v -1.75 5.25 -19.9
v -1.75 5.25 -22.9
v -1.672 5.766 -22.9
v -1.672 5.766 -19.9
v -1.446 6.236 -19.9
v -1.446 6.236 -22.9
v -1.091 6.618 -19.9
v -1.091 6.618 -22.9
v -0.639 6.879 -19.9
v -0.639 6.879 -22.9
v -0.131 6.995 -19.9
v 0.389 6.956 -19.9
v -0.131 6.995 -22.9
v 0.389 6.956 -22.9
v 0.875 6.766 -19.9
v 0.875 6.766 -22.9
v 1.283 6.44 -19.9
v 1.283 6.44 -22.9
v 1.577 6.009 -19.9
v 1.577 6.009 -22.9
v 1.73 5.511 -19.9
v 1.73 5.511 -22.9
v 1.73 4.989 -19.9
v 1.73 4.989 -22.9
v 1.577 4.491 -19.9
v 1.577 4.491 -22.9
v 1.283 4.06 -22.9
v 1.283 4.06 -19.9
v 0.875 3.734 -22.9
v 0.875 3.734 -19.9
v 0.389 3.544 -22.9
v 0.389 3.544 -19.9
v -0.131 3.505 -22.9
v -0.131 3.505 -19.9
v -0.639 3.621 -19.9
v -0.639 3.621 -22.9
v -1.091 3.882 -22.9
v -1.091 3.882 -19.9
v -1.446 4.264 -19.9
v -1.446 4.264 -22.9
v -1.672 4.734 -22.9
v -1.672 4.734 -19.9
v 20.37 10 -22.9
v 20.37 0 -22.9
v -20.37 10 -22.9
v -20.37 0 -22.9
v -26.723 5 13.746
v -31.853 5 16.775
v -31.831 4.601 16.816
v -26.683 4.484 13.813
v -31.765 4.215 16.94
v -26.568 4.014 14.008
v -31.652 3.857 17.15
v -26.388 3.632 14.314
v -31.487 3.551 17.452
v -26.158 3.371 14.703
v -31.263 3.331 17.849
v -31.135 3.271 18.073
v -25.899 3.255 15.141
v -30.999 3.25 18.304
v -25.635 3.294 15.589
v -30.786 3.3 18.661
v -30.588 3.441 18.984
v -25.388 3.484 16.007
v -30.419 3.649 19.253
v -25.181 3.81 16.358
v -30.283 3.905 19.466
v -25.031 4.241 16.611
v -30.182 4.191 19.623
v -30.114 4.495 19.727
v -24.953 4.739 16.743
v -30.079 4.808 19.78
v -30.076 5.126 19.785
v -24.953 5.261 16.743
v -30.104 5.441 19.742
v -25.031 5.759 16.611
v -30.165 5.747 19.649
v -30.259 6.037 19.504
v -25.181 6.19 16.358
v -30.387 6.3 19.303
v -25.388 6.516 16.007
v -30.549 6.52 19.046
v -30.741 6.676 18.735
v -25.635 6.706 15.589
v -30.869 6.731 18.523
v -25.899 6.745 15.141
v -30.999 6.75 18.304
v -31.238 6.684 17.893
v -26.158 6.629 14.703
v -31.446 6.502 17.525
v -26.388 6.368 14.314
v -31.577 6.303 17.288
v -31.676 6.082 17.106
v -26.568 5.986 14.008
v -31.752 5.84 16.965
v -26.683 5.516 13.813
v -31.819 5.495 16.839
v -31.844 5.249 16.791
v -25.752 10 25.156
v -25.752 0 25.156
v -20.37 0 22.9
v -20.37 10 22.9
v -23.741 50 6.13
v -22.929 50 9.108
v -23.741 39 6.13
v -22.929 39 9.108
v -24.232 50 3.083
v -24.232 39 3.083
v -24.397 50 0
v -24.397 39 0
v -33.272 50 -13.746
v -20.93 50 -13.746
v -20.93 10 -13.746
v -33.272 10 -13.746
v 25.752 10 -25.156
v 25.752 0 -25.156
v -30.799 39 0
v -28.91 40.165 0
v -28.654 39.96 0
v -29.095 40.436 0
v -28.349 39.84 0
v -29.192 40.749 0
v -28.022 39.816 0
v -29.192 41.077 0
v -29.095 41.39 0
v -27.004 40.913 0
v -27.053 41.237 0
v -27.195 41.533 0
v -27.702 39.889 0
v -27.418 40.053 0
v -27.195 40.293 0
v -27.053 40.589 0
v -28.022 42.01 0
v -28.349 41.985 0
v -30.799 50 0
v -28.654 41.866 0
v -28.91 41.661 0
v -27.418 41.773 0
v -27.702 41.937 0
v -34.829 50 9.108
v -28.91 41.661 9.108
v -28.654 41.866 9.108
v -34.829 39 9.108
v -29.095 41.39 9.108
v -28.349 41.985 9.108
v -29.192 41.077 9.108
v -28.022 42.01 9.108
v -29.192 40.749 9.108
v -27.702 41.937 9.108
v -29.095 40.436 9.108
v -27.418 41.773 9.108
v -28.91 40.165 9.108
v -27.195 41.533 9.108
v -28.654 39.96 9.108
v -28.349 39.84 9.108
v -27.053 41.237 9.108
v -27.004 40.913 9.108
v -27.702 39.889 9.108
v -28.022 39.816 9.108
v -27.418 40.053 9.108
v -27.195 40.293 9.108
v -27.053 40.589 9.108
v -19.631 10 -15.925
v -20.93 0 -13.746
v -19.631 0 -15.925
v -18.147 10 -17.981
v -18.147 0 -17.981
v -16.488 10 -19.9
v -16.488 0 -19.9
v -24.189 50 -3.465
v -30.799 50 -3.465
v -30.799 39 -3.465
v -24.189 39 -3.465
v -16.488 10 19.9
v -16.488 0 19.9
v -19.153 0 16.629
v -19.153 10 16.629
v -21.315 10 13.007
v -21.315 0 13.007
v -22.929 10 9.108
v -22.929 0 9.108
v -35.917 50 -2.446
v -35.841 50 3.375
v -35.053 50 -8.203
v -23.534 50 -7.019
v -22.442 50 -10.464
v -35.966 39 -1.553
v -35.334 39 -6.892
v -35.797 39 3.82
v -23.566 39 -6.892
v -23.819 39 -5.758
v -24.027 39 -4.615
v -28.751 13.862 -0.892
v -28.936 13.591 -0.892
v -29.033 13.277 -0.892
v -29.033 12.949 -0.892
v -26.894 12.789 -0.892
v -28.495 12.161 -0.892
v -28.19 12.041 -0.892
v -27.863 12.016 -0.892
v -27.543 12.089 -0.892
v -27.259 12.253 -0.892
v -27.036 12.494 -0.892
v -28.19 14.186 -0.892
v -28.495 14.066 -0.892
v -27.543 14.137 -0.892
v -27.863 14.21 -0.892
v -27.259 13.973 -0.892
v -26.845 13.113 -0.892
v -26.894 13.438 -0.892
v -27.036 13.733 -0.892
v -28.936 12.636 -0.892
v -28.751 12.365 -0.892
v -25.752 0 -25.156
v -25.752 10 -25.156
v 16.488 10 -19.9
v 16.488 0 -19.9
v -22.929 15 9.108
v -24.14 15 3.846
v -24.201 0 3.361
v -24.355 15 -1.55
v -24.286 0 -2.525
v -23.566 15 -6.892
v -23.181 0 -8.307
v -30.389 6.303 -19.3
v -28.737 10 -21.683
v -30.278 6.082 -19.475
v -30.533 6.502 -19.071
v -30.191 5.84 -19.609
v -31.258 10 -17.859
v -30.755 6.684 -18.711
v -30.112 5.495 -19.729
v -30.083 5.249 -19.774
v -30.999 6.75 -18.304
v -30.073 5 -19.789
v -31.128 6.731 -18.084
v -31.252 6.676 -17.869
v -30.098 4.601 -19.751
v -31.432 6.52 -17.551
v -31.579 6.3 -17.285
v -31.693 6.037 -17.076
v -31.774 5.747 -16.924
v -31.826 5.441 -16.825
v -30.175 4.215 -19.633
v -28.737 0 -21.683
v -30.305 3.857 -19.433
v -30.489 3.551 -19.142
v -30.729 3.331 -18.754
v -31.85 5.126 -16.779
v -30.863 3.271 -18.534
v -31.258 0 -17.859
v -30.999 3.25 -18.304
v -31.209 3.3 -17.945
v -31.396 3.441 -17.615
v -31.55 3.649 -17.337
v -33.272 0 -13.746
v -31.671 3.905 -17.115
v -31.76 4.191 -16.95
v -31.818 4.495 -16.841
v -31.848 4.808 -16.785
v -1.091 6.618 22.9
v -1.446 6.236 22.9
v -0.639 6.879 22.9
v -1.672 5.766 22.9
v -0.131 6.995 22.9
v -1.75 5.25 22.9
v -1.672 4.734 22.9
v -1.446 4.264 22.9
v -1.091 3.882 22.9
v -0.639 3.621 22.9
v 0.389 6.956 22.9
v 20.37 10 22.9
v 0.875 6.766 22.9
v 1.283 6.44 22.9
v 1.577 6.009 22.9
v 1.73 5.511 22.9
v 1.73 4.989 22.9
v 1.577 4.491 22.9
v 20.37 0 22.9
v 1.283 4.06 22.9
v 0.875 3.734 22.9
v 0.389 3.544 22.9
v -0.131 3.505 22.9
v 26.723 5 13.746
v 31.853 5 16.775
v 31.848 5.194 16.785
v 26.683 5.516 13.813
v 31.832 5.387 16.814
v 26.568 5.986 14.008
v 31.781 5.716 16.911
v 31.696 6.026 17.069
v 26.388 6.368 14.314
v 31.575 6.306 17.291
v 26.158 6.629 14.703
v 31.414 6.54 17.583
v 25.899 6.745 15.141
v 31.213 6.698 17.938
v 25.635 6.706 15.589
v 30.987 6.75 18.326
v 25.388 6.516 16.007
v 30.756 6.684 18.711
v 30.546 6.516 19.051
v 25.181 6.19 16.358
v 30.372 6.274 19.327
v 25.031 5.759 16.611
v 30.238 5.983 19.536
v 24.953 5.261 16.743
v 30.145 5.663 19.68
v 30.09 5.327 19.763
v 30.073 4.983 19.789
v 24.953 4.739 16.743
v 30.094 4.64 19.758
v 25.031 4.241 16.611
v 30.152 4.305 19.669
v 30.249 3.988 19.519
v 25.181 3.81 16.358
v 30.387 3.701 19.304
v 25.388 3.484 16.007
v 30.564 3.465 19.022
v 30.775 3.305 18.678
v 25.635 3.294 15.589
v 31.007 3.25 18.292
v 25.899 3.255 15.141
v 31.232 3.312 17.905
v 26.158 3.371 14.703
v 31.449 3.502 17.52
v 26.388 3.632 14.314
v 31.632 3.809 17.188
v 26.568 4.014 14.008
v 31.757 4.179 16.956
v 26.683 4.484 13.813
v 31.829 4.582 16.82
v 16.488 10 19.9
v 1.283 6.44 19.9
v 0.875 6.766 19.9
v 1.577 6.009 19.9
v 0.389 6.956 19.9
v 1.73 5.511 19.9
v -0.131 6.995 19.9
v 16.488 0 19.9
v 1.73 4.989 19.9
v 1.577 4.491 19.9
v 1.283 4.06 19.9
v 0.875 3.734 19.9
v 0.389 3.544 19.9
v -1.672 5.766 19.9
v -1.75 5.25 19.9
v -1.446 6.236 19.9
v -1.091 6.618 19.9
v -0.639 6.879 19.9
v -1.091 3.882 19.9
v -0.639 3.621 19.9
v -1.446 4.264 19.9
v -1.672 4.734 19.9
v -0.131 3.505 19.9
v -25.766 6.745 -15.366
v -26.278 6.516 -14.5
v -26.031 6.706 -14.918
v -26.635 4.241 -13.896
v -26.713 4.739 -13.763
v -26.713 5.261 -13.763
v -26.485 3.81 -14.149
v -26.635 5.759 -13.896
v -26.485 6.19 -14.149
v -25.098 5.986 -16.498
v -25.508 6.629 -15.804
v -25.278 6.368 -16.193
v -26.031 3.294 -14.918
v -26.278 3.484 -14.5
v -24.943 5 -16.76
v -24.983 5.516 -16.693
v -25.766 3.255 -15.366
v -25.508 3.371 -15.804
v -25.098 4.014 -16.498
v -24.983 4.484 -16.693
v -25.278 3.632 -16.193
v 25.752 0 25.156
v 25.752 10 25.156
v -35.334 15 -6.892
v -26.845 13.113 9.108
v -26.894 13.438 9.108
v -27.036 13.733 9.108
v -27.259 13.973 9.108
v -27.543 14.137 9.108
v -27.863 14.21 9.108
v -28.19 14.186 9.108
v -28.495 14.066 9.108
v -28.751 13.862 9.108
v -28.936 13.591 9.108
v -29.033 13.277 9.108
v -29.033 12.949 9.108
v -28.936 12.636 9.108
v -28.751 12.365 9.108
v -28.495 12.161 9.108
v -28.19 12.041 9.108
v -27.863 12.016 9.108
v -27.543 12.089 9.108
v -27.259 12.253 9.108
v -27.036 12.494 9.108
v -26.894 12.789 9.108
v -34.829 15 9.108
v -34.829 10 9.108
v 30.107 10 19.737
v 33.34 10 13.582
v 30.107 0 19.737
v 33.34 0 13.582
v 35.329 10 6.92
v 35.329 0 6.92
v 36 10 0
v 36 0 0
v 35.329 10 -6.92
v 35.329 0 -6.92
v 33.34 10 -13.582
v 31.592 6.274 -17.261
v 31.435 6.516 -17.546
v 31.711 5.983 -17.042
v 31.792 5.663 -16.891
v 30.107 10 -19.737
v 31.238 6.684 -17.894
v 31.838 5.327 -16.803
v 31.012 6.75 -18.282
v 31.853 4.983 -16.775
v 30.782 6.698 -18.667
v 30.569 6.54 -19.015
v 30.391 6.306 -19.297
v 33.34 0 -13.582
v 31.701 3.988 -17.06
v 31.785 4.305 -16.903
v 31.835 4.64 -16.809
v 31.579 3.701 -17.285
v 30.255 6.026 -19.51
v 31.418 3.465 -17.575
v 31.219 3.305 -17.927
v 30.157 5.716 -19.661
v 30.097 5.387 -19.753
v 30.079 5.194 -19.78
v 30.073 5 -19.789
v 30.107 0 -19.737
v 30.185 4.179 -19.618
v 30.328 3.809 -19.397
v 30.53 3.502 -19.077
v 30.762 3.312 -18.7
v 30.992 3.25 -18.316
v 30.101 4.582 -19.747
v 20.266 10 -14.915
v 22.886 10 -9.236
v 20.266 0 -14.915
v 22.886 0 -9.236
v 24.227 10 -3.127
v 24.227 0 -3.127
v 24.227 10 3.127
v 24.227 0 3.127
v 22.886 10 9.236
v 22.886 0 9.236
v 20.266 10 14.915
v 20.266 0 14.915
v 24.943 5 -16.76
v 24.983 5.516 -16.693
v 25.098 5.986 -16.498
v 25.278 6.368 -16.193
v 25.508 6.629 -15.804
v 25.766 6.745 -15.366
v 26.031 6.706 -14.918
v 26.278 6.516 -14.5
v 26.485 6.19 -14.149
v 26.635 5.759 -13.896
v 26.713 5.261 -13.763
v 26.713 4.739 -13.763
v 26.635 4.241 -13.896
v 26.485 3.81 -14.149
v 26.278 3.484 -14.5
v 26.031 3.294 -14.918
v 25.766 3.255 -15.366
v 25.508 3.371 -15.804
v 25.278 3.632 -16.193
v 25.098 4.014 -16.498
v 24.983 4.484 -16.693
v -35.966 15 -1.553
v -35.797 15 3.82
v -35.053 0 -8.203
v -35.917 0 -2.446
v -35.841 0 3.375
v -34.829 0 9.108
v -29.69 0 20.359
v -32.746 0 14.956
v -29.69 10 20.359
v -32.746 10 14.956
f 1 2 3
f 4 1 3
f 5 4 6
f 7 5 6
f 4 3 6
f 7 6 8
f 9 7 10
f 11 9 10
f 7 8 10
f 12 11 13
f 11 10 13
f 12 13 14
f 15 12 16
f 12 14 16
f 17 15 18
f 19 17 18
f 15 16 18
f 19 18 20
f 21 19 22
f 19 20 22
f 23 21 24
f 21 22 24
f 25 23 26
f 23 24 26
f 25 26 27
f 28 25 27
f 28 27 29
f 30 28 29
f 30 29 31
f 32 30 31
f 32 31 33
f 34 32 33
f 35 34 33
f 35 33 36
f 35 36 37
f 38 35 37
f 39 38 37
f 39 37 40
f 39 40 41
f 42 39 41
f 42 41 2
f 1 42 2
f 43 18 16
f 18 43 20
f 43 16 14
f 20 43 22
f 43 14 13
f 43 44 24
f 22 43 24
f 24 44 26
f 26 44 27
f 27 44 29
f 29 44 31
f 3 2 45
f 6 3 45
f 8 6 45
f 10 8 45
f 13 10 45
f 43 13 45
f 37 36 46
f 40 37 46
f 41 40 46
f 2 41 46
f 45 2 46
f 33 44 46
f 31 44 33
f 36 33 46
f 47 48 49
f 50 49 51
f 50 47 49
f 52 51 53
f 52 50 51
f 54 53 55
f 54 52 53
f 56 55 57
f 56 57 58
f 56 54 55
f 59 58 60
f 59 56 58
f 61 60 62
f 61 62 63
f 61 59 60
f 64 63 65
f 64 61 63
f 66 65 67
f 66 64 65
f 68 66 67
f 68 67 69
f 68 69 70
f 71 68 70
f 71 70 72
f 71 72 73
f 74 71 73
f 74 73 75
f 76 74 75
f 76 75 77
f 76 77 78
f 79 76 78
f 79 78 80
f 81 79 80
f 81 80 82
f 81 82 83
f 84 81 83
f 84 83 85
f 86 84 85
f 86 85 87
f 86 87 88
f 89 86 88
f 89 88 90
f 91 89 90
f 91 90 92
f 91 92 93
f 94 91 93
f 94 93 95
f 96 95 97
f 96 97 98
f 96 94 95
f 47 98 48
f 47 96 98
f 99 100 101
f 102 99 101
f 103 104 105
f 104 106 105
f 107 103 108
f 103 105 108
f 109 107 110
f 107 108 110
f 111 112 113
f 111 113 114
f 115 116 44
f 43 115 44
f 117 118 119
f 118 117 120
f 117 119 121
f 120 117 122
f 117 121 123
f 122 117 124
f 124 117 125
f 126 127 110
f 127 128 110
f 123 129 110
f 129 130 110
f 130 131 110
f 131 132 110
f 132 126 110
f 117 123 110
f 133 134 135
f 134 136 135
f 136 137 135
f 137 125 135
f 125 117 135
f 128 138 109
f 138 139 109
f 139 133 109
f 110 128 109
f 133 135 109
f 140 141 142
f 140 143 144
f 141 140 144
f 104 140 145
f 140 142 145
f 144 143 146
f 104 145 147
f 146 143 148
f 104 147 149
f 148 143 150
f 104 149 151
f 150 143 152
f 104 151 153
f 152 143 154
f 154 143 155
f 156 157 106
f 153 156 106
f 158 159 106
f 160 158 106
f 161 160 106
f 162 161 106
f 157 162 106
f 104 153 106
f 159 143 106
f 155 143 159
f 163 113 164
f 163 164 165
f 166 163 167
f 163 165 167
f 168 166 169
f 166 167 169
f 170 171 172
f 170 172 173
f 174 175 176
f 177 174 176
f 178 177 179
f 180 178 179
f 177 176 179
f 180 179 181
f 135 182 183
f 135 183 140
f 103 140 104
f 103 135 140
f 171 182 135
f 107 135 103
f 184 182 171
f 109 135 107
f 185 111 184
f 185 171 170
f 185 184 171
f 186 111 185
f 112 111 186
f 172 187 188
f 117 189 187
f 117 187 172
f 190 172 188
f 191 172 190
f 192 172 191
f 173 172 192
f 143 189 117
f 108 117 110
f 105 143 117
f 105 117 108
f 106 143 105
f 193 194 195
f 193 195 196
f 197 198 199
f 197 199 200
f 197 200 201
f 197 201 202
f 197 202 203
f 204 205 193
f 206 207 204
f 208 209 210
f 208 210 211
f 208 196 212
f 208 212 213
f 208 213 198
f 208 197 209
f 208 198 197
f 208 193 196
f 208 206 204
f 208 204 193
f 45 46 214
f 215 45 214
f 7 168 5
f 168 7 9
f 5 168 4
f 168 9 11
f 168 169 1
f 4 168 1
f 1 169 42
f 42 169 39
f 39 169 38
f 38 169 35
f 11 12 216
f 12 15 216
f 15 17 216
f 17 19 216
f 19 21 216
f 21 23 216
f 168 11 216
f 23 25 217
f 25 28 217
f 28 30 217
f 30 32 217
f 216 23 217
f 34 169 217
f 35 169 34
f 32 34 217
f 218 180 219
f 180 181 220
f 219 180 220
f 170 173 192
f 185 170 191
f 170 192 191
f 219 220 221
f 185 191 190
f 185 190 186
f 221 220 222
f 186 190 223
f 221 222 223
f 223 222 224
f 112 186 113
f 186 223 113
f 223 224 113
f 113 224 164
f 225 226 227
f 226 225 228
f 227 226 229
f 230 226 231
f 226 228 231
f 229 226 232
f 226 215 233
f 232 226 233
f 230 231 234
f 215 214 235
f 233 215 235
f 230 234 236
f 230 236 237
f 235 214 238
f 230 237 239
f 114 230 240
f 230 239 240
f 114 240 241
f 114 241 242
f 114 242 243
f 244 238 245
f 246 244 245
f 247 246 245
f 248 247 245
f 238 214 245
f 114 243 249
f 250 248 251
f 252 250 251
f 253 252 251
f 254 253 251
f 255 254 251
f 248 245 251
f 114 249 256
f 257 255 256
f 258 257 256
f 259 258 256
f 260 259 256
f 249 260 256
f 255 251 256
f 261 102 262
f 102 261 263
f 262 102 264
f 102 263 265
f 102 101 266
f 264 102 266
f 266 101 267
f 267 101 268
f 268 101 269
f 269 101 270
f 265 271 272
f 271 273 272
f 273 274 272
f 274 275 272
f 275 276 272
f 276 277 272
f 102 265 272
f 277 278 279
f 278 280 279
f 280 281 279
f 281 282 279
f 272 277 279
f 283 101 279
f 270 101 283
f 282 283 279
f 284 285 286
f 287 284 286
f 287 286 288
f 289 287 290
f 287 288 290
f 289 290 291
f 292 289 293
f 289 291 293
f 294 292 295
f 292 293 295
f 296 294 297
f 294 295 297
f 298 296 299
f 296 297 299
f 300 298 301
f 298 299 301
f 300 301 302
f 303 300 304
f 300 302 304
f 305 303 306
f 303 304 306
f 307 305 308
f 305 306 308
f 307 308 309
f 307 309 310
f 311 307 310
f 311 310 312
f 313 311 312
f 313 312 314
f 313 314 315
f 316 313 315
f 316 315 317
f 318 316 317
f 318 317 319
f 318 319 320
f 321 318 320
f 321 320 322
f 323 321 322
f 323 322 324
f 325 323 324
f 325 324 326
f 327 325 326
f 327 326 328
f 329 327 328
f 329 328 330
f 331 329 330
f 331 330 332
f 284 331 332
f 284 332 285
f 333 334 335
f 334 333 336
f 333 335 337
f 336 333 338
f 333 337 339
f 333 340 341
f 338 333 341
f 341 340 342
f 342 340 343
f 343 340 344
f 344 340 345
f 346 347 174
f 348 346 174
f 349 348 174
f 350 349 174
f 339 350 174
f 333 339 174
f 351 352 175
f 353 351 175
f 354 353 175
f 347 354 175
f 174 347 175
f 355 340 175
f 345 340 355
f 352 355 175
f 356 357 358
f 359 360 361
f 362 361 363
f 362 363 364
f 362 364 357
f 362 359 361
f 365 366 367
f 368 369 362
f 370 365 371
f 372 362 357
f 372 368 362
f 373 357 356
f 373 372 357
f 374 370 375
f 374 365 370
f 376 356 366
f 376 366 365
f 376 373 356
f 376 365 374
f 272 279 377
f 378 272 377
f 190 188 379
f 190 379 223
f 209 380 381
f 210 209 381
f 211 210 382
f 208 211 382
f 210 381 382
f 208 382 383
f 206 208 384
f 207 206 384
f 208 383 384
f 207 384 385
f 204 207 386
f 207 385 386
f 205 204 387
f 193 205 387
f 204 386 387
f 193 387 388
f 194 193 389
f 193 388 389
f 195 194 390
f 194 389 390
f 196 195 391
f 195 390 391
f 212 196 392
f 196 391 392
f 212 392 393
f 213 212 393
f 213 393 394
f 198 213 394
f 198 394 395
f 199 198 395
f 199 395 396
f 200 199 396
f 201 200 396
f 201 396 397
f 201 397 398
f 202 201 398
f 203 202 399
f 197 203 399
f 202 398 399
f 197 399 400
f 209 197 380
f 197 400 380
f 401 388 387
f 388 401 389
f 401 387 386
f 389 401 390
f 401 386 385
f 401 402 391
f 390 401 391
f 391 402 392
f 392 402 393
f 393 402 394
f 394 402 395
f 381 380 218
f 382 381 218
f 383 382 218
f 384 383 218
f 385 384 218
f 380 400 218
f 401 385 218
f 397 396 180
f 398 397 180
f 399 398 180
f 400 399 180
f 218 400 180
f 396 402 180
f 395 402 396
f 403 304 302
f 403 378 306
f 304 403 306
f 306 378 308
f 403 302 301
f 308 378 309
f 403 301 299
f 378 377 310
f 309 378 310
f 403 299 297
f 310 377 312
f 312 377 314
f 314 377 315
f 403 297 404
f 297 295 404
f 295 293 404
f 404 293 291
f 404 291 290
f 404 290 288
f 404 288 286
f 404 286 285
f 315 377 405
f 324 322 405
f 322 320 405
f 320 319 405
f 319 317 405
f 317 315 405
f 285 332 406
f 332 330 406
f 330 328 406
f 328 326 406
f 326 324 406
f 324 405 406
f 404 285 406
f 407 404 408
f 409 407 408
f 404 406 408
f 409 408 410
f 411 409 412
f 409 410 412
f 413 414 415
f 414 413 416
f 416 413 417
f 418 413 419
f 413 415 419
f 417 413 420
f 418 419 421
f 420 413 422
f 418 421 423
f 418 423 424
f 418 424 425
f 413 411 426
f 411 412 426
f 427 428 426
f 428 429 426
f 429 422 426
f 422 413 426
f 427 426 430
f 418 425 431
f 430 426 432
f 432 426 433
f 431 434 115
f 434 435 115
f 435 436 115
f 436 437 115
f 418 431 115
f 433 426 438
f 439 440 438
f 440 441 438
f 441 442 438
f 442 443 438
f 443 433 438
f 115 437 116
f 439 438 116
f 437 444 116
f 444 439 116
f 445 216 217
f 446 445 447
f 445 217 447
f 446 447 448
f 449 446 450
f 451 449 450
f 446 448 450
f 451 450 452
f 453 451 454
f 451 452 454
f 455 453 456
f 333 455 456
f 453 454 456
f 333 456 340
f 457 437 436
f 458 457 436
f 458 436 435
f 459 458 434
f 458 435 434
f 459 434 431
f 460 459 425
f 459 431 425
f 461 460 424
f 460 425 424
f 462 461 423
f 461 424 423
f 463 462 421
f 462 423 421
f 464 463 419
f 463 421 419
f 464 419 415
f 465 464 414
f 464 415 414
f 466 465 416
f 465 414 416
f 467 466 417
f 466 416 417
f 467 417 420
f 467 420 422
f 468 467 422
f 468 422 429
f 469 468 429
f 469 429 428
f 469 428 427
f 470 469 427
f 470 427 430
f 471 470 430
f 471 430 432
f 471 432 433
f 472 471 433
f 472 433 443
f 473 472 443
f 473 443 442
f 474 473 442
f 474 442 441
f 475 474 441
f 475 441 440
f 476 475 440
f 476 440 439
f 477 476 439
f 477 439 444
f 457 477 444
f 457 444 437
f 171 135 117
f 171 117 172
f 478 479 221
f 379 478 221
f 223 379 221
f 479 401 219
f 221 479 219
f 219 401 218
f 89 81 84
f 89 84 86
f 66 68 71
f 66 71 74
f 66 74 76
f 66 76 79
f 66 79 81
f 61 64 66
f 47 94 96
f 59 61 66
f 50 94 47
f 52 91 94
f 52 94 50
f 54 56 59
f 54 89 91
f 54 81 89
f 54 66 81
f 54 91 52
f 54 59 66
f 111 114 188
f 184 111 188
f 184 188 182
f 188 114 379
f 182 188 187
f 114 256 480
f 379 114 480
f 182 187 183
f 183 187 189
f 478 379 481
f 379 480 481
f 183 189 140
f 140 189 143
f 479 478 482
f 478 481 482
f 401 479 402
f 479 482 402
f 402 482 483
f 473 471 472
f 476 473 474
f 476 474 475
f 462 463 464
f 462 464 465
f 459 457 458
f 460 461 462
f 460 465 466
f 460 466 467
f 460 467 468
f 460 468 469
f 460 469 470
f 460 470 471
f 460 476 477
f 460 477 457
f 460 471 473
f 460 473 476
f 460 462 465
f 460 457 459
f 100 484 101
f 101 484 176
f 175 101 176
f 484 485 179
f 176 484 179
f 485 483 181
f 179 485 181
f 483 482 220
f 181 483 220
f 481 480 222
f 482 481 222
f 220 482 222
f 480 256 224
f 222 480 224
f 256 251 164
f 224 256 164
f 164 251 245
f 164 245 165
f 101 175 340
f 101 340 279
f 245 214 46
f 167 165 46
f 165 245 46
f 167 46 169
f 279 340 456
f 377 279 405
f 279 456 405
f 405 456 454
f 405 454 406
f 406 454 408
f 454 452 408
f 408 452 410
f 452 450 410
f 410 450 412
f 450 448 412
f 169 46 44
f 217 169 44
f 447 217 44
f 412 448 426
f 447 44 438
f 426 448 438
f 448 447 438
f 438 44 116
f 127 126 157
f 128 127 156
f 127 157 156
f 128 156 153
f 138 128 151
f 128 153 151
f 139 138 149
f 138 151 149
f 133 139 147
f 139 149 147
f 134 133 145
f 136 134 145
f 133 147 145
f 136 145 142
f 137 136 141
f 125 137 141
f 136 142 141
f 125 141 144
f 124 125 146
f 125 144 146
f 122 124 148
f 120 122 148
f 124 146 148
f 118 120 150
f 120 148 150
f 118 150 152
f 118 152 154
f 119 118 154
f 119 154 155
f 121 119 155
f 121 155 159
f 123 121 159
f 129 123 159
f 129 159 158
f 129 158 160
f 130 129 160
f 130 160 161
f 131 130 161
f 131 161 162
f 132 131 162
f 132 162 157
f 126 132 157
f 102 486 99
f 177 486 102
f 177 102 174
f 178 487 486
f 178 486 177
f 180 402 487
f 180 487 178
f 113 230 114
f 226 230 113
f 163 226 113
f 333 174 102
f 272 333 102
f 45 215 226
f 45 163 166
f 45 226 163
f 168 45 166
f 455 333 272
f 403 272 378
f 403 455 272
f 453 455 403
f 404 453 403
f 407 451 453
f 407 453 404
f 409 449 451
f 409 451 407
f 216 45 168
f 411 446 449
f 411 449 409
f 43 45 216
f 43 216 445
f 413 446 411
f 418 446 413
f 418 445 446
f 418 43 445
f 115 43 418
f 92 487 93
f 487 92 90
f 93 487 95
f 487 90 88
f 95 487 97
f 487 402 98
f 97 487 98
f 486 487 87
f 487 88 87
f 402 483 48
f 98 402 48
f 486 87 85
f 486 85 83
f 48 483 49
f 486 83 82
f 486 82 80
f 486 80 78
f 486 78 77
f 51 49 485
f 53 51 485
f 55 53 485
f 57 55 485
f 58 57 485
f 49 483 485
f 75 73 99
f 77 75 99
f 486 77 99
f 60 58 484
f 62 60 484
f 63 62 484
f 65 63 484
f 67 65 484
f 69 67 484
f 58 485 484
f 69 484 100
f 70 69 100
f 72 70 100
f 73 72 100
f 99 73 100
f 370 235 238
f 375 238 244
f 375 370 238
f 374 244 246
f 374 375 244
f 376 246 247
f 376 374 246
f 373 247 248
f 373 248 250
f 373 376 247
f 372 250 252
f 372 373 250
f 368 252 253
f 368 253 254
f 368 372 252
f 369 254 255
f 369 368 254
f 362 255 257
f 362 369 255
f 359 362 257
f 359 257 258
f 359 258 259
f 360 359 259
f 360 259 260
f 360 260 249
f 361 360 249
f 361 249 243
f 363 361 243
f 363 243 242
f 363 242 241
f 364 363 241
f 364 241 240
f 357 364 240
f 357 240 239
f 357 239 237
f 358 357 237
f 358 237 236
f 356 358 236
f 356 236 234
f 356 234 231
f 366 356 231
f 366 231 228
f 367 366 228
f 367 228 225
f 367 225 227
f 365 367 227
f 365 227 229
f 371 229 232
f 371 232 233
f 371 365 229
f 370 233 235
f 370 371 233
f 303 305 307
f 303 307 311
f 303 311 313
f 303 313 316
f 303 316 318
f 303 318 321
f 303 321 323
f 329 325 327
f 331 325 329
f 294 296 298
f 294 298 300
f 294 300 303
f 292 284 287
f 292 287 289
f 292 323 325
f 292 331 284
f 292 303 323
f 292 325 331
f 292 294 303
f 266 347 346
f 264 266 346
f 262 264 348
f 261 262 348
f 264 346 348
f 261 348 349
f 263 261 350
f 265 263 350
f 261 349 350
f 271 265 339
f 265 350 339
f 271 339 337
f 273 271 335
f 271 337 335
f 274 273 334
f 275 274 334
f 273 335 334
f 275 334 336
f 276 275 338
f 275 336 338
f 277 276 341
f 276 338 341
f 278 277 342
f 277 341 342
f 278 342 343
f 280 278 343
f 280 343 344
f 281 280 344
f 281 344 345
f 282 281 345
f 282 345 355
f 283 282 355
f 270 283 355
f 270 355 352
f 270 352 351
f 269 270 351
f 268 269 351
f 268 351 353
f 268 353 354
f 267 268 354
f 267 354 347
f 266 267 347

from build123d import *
from build123d.topology import SkipClean

# Parameters (mm, degrees)
BOSS_EXTRUDE1_DEPTH = 10
BOSS_EXTRUDE3_DEPTH = 50
SKETCH3_W           = 18.659519989
SKETCH3_H           = 24
CUT_EXTRUDE2_DEPTH  = 16
SKETCH4_W           = 7.007010428
SKETCH4_H           = 3.464986189
CUT_EXTRUDE4_DEPTH  = 11
SKETCH6_R           = 1.75
CUT_EXTRUDE5_DEPTH  = 50
SKETCH7_R           = 1.1
CUT_EXTRUDE6_DEPTH  = 10
SKETCH8_R           = 1.1
CUT_EXTRUDE7_DEPTH  = 10
SKETCH12_R          = 1.75
CUT_EXTRUDE11_DEPTH = 6
SKETCH13_R          = 1.75
CUT_EXTRUDE12_DEPTH = 6
CUT_EXTRUDE13_START = -6
SKETCH15_R          = 1.75
CUT_EXTRUDE13_DEPTH = 6
CUT_EXTRUDE14_START = -6
SKETCH16_R          = 1.75
CUT_EXTRUDE14_DEPTH = 6


with BuildPart() as part:
    # Sketch1 → Boss-Extrude1 (new body)
    with BuildSketch(Plane(origin=(0, 0, 0), x_dir=(1, 0, 0), z_dir=(0, 1, 0))):
        with BuildLine():
            Line((-20.369908508, -22.9), (20.369908508, -22.9))
            Line((20.369908508, -22.9), (25.75194079, -25.156262551))
            ThreePointArc((25.75194079, -25.156262551), (36, 0), (25.75194079, 25.156262551))
            Line((25.75194079, 25.156262551), (20.369908508, 22.9))
            Line((20.369908508, 22.9), (-20.369908508, 22.9))
            Line((-20.369908508, 22.9), (-25.75194079, 25.156262551))
            ThreePointArc((-25.75194079, 25.156262551), (-30.058427692, 19.811383714), (-33.272198921, 13.746300555))
            Line((-33.272198921, 13.746300555), (-20.930426703, 13.746300555))
            ThreePointArc((-20.930426703, 13.746300555), (-18.911500586, 16.969147591), (-16.488091862, 19.9))
            Line((-16.488091862, 19.9), (16.488091862, 19.9))
            ThreePointArc((16.488091862, 19.9), (24.396538405, 0), (16.488091862, -19.9))
            Line((16.488091862, -19.9), (-16.488091862, -19.9))
            ThreePointArc((-16.488091862, -19.9), (-20.300121646, -14.857351831), (-22.928570874, -9.108340935))
            Line((-22.928570874, -9.108340935), (-34.828696866, -9.108340935))
            ThreePointArc((-34.828696866, -9.108340935), (-31.335081965, -17.723223133), (-25.75194079, -25.156262551))
            Line((-25.75194079, -25.156262551), (-20.369908508, -22.9))
        make_face()
    extrude(amount=BOSS_EXTRUDE1_DEPTH)

    # Sketch1<5> → Boss-Extrude3 (add)
    with BuildSketch(Plane(origin=(0, 0, 0), x_dir=(1, 0, 0), z_dir=(0, 1, 0))):
        with BuildLine():
            ThreePointArc((-33.272198921, 13.746300555), (-35.916801934, 2.44608643), (-34.828696866, -9.108340935))
            Line((-34.828696866, -9.108340935), (-22.928570874, -9.108340935))
            ThreePointArc((-22.928570874, -9.108340935), (-24.286368586, 2.525037107), (-20.930426703, 13.746300555))
            Line((-20.930426703, 13.746300555), (-33.272198921, 13.746300555))
        make_face()
    extrude(amount=BOSS_EXTRUDE3_DEPTH)

    # Sketch3 → Cut-Extrude2 (cut)
    with BuildSketch(Plane.XY.offset(9.108340935)):
        with Locations((-32.258330869, 27)):
            Rectangle(SKETCH3_W, SKETCH3_H)
    extrude(amount=-CUT_EXTRUDE2_DEPTH, mode=Mode.SUBTRACT)

    # Sketch4 → Cut-Extrude4 (cut)
    with BuildSketch(Plane(origin=(0, 50, 0), x_dir=(1, 0, 0), z_dir=(0, 1, 0))):
        with Locations((-27.295412644, 1.732493095)):
            Rectangle(SKETCH4_W, SKETCH4_H)
    extrude(amount=-CUT_EXTRUDE4_DEPTH, mode=Mode.SUBTRACT)

    # Sketch6 → Cut-Extrude5 (cut)
    with BuildSketch(Plane(origin=(0, 0, -22.9), x_dir=(-1, 0, 0), z_dir=(0, 0, -1))):
        with Locations((0, 5.25)):
            Circle(SKETCH6_R)
    extrude(amount=-CUT_EXTRUDE5_DEPTH, mode=Mode.SUBTRACT)

    # Sketch7 → Cut-Extrude6 (cut)
    with BuildSketch(Plane.XY.offset(9.108340935)):
        with Locations((-28.103908, 40.912886193)):
            Circle(SKETCH7_R)
    extrude(amount=-CUT_EXTRUDE6_DEPTH, mode=Mode.SUBTRACT)

    # Sketch8 → Cut-Extrude7 (cut)
    with BuildSketch(Plane.XY.offset(9.108340935)):
        with Locations((-27.944858765, 13.113341173)):
            Circle(SKETCH8_R)
    extrude(amount=-CUT_EXTRUDE7_DEPTH, mode=Mode.SUBTRACT)

    # Sketch12 → Cut-Extrude11 (cut)
    with BuildSketch(Plane(origin=(30.999475006, 10, 18.303894377), x_dir=(0.5084415104778145, 0, -0.8610965279357702), z_dir=(0.8610965279357702, 0, 0.5084415104778145))):
        with Locations((0, -5)):
            Circle(SKETCH12_R)
    extrude(amount=-CUT_EXTRUDE11_DEPTH, mode=Mode.SUBTRACT)

    # Sketch13 → Cut-Extrude12 (cut)
    with BuildSketch(Plane(origin=(30.999475006, 10, -18.303894377), x_dir=(-0.5084415104778145, 0, -0.8610965279357701), z_dir=(0.8610965279357701, 0, -0.5084415104778145))):
        with Locations((0, -5)):
            Circle(SKETCH13_R)
    extrude(amount=-CUT_EXTRUDE12_DEPTH, mode=Mode.SUBTRACT)

    # Sketch15 → Cut-Extrude13 (cut)
    with SkipClean():  # the faces are left unmerged after this step: merging them gives an invalid solid
        with BuildSketch(Plane(origin=(-30.999475006, 10, 18.303894377), x_dir=(0.5084415104778142, 0, 0.8610965279357703), z_dir=(-0.8610965279357703, 0, 0.5084415104778142)).offset(CUT_EXTRUDE13_START)):
            with Locations((0, -5)):
                Circle(SKETCH15_R)
        extrude(amount=CUT_EXTRUDE13_DEPTH, mode=Mode.SUBTRACT)

    # Sketch16 → Cut-Extrude14 (cut)
    with SkipClean():  # the faces are left unmerged after this step: merging them gives an invalid solid
        with BuildSketch(Plane(origin=(-30.999475006, 10, -18.303894377), x_dir=(-0.508441510477814, 0, 0.8610965279357704), z_dir=(-0.8610965279357704, 0, -0.508441510477814)).offset(CUT_EXTRUDE14_START)):
            with Locations((0, -5)):
                Circle(SKETCH16_R)
        extrude(amount=CUT_EXTRUDE14_DEPTH, mode=Mode.SUBTRACT)


solid = part.part
